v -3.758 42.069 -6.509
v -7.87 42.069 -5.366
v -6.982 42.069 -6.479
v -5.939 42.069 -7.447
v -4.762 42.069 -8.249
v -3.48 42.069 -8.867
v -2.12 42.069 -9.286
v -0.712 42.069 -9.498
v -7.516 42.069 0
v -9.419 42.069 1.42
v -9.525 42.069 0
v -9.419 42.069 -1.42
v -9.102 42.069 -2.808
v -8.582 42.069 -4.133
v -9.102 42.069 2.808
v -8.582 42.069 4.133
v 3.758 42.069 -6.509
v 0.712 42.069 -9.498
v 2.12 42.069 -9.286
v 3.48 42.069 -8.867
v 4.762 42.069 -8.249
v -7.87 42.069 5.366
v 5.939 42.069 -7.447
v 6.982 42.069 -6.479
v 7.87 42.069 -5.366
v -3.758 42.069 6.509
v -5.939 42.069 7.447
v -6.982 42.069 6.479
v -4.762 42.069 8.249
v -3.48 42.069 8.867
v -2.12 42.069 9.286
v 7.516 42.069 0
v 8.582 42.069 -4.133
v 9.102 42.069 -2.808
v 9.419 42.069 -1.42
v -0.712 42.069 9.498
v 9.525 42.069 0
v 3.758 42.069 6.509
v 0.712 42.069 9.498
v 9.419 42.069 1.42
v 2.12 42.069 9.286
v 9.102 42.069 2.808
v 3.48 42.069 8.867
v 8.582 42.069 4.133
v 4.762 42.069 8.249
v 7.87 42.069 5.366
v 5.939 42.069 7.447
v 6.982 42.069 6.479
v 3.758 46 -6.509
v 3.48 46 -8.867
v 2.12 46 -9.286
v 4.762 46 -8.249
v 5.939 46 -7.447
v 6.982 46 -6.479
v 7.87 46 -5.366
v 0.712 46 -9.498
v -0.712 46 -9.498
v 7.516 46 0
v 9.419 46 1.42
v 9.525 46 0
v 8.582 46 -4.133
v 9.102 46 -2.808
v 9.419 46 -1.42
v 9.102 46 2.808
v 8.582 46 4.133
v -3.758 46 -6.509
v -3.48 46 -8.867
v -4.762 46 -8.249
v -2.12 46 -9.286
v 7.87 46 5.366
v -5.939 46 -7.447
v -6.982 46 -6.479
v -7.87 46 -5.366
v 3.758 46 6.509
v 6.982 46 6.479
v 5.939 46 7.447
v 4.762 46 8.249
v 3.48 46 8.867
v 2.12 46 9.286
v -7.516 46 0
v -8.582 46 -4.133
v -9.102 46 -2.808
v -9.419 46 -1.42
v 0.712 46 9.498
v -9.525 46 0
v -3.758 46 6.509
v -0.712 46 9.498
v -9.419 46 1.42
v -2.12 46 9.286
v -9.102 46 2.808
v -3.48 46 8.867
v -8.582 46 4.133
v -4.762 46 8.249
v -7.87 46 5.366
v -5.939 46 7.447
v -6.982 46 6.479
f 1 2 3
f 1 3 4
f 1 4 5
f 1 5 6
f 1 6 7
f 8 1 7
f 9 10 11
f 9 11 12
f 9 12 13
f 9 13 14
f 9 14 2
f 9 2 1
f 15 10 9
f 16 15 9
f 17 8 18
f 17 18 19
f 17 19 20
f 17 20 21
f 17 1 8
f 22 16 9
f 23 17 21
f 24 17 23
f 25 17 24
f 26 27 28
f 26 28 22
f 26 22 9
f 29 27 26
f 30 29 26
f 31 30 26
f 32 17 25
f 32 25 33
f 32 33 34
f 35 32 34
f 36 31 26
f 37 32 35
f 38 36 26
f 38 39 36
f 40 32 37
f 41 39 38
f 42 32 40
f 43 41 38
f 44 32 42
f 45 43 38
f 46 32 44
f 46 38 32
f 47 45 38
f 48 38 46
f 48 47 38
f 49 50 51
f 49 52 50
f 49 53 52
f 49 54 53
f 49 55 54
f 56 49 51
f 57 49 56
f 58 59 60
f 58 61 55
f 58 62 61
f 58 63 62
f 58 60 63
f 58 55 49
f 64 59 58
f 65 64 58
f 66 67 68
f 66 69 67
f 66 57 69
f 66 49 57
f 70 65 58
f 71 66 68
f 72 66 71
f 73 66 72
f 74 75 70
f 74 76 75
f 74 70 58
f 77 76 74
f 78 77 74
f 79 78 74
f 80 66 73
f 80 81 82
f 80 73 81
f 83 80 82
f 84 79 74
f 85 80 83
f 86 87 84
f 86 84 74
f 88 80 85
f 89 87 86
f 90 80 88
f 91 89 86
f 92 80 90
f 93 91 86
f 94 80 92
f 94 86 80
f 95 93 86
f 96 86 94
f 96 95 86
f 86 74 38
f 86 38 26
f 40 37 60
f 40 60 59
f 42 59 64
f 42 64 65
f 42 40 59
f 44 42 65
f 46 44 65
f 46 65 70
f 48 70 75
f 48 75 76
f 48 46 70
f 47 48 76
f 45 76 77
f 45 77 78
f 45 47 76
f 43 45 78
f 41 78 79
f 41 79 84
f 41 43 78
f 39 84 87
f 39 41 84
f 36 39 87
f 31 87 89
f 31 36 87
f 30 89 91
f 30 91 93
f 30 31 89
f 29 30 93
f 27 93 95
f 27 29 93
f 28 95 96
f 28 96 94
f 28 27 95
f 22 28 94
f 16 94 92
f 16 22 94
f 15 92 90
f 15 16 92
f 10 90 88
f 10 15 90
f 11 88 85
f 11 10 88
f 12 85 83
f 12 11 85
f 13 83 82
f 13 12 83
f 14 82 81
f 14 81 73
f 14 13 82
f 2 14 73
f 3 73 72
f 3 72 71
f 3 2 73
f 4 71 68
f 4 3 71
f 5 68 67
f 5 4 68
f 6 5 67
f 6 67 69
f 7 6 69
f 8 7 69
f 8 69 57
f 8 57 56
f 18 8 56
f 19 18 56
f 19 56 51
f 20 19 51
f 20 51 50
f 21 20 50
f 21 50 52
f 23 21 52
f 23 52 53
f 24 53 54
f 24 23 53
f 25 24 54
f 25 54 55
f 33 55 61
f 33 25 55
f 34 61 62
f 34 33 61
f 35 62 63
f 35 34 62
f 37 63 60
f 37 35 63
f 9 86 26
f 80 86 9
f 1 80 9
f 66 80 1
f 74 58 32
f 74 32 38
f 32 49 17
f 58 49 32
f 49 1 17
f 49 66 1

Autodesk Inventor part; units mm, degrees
ref_plane "YZ Plane" through (0, 0, 0) normal (1, 0, 0) x (0, 1, 0)
ref_plane "XZ Plane" through (0, 0, 0) normal (0, 1, 0) x (-1, 0, 0)
ref_plane "XY Plane" through (0, 0, 0) normal (0, 0, 1) x (1, 0, 0)
sketch "Sketch1" plane through (0, 0, 0) normal (0, 1, 0) x (-1, 0, 0)
  circle A0 centre (0, 0) radius 28.5
  circle A1 centre (0, 0) radius 9
  circle A2 centre (11.875, 20.5681) radius 1.5875
  circle A3 centre (-11.875, 20.5681) radius 1.5875
  circle A4 centre (23.75, 0) radius 1.5875
  circle A5 centre (11.875, -20.5681) radius 1.5875
  circle A6 centre (-11.875, -20.5681) radius 1.5875
  circle A7 centre (-23.75, 0) radius 1.5875
  dimension "d5" = 3.175
  dimension "d6" = 20.5681
  dimension "d7" = 3.175
  dimension "d8" = 3.175
  dimension "d9" = 3.175
  dimension "d10" = 3.175
  dimension "d11" = 3.175
extrude "Extrusion1" add sketch "Sketch1" along normal blind 46
sketch "Sketch2" plane through (0, 46, 0) normal (0, 1, 0) x (1, 0, 0)
  line L0 (7.5157, 0) -> (3.7578, -6.5088)
  line L1 (3.7578, -6.5088) -> (-3.7578, -6.5088)
  line L2 (-3.7578, -6.5088) -> (-7.5157, 0)
  line L3 (-7.5157, 0) -> (-3.7578, 6.5088)
  line L4 (-3.7578, 6.5088) -> (3.7578, 6.5088)
  line L5 (3.7578, 6.5088) -> (7.5157, 0)
  circle A0 centre (0, 0) radius 28.5 projected
  circle A1 centre (-11.875, -20.5681) radius 1.5875 projected
  circle A2 centre (11.875, -20.5681) radius 1.5875 projected
  circle A3 centre (-23.75, 0) radius 1.5875 projected
  circle A4 centre (-11.875, 20.5681) radius 1.5875 projected
  circle A5 centre (23.75, 0) radius 1.5875 projected
  circle A6 centre (11.875, 20.5681) radius 1.5875 projected
  dimension "d4" = 13.0175
extrude "Extrusion2" add sketch "Sketch2" against normal blind 46
sketch "Sketch3" plane through (0, 46, 0) normal (0, 1, 0) x (1, 0, 0)
  circle A0 centre (-11.875, 20.5681) radius 1.5875 projected
  circle A1 centre (-11.875, 20.5681) radius 2.3812
  circle A2 centre (11.875, 20.5681) radius 1.5875 projected
  circle A3 centre (11.875, 20.5681) radius 2.3812
  circle A4 centre (23.75, 0) radius 1.5875 projected
  circle A5 centre (23.75, 0) radius 2.3813
  circle A6 centre (11.875, -20.5681) radius 1.5875 projected
  circle A7 centre (11.875, -20.5681) radius 2.3813
  circle A8 centre (-11.875, -20.5681) radius 1.5875 projected
  circle A9 centre (-11.875, -20.5681) radius 2.3812
  circle A10 centre (-23.75, 0) radius 1.5875 projected
  circle A11 centre (-23.75, 0) radius 2.3812
  point P0 (0, 0)
  dimension "d12" = 4.7625
  dimension "d13" = 4.7625
  dimension "d14" = 4.7625
  dimension "d15" = 4.7625
  dimension "d16" = 4.7625
  dimension "d17" = 4.7625
extrude "Extrusion3" add sketch "Sketch3" along normal blind 2.3813 and the other way blind 48.3807 contours A0 | A1 | A2 | A3 | A4 | A5 | A6 | A7 | A8 | A9 | A10 | A11
sketch "Sketch4" plane through (11.875, -2.3806, 20.5681) normal (0, -1, 0) x (1, 0, 0)
  circle A0 centre (-11.875, -20.5681) radius 42.5802
extrude "Extrusion4" cut sketch "Sketch4" against normal blind 44.45
sketch "Sketch5" plane through (0, 42.0694, 0) normal (0, -1, 0) x (1, 0, 0)
  circle A0 centre (0, 0) radius 9.525
  circle A1 centre (0, 0) radius 31.269
  dimension "d24" = 19.05
extrude "Extrusion5" cut sketch "Sketch5" against normal blind 25.4
equation "\"d7\" = d5"
equation "\"d8\" = d5"
equation "\"d9\" = d5"
equation "\"d10\" = d5"
equation "\"d11\" = d5"
properties part number "new mech inside test"
